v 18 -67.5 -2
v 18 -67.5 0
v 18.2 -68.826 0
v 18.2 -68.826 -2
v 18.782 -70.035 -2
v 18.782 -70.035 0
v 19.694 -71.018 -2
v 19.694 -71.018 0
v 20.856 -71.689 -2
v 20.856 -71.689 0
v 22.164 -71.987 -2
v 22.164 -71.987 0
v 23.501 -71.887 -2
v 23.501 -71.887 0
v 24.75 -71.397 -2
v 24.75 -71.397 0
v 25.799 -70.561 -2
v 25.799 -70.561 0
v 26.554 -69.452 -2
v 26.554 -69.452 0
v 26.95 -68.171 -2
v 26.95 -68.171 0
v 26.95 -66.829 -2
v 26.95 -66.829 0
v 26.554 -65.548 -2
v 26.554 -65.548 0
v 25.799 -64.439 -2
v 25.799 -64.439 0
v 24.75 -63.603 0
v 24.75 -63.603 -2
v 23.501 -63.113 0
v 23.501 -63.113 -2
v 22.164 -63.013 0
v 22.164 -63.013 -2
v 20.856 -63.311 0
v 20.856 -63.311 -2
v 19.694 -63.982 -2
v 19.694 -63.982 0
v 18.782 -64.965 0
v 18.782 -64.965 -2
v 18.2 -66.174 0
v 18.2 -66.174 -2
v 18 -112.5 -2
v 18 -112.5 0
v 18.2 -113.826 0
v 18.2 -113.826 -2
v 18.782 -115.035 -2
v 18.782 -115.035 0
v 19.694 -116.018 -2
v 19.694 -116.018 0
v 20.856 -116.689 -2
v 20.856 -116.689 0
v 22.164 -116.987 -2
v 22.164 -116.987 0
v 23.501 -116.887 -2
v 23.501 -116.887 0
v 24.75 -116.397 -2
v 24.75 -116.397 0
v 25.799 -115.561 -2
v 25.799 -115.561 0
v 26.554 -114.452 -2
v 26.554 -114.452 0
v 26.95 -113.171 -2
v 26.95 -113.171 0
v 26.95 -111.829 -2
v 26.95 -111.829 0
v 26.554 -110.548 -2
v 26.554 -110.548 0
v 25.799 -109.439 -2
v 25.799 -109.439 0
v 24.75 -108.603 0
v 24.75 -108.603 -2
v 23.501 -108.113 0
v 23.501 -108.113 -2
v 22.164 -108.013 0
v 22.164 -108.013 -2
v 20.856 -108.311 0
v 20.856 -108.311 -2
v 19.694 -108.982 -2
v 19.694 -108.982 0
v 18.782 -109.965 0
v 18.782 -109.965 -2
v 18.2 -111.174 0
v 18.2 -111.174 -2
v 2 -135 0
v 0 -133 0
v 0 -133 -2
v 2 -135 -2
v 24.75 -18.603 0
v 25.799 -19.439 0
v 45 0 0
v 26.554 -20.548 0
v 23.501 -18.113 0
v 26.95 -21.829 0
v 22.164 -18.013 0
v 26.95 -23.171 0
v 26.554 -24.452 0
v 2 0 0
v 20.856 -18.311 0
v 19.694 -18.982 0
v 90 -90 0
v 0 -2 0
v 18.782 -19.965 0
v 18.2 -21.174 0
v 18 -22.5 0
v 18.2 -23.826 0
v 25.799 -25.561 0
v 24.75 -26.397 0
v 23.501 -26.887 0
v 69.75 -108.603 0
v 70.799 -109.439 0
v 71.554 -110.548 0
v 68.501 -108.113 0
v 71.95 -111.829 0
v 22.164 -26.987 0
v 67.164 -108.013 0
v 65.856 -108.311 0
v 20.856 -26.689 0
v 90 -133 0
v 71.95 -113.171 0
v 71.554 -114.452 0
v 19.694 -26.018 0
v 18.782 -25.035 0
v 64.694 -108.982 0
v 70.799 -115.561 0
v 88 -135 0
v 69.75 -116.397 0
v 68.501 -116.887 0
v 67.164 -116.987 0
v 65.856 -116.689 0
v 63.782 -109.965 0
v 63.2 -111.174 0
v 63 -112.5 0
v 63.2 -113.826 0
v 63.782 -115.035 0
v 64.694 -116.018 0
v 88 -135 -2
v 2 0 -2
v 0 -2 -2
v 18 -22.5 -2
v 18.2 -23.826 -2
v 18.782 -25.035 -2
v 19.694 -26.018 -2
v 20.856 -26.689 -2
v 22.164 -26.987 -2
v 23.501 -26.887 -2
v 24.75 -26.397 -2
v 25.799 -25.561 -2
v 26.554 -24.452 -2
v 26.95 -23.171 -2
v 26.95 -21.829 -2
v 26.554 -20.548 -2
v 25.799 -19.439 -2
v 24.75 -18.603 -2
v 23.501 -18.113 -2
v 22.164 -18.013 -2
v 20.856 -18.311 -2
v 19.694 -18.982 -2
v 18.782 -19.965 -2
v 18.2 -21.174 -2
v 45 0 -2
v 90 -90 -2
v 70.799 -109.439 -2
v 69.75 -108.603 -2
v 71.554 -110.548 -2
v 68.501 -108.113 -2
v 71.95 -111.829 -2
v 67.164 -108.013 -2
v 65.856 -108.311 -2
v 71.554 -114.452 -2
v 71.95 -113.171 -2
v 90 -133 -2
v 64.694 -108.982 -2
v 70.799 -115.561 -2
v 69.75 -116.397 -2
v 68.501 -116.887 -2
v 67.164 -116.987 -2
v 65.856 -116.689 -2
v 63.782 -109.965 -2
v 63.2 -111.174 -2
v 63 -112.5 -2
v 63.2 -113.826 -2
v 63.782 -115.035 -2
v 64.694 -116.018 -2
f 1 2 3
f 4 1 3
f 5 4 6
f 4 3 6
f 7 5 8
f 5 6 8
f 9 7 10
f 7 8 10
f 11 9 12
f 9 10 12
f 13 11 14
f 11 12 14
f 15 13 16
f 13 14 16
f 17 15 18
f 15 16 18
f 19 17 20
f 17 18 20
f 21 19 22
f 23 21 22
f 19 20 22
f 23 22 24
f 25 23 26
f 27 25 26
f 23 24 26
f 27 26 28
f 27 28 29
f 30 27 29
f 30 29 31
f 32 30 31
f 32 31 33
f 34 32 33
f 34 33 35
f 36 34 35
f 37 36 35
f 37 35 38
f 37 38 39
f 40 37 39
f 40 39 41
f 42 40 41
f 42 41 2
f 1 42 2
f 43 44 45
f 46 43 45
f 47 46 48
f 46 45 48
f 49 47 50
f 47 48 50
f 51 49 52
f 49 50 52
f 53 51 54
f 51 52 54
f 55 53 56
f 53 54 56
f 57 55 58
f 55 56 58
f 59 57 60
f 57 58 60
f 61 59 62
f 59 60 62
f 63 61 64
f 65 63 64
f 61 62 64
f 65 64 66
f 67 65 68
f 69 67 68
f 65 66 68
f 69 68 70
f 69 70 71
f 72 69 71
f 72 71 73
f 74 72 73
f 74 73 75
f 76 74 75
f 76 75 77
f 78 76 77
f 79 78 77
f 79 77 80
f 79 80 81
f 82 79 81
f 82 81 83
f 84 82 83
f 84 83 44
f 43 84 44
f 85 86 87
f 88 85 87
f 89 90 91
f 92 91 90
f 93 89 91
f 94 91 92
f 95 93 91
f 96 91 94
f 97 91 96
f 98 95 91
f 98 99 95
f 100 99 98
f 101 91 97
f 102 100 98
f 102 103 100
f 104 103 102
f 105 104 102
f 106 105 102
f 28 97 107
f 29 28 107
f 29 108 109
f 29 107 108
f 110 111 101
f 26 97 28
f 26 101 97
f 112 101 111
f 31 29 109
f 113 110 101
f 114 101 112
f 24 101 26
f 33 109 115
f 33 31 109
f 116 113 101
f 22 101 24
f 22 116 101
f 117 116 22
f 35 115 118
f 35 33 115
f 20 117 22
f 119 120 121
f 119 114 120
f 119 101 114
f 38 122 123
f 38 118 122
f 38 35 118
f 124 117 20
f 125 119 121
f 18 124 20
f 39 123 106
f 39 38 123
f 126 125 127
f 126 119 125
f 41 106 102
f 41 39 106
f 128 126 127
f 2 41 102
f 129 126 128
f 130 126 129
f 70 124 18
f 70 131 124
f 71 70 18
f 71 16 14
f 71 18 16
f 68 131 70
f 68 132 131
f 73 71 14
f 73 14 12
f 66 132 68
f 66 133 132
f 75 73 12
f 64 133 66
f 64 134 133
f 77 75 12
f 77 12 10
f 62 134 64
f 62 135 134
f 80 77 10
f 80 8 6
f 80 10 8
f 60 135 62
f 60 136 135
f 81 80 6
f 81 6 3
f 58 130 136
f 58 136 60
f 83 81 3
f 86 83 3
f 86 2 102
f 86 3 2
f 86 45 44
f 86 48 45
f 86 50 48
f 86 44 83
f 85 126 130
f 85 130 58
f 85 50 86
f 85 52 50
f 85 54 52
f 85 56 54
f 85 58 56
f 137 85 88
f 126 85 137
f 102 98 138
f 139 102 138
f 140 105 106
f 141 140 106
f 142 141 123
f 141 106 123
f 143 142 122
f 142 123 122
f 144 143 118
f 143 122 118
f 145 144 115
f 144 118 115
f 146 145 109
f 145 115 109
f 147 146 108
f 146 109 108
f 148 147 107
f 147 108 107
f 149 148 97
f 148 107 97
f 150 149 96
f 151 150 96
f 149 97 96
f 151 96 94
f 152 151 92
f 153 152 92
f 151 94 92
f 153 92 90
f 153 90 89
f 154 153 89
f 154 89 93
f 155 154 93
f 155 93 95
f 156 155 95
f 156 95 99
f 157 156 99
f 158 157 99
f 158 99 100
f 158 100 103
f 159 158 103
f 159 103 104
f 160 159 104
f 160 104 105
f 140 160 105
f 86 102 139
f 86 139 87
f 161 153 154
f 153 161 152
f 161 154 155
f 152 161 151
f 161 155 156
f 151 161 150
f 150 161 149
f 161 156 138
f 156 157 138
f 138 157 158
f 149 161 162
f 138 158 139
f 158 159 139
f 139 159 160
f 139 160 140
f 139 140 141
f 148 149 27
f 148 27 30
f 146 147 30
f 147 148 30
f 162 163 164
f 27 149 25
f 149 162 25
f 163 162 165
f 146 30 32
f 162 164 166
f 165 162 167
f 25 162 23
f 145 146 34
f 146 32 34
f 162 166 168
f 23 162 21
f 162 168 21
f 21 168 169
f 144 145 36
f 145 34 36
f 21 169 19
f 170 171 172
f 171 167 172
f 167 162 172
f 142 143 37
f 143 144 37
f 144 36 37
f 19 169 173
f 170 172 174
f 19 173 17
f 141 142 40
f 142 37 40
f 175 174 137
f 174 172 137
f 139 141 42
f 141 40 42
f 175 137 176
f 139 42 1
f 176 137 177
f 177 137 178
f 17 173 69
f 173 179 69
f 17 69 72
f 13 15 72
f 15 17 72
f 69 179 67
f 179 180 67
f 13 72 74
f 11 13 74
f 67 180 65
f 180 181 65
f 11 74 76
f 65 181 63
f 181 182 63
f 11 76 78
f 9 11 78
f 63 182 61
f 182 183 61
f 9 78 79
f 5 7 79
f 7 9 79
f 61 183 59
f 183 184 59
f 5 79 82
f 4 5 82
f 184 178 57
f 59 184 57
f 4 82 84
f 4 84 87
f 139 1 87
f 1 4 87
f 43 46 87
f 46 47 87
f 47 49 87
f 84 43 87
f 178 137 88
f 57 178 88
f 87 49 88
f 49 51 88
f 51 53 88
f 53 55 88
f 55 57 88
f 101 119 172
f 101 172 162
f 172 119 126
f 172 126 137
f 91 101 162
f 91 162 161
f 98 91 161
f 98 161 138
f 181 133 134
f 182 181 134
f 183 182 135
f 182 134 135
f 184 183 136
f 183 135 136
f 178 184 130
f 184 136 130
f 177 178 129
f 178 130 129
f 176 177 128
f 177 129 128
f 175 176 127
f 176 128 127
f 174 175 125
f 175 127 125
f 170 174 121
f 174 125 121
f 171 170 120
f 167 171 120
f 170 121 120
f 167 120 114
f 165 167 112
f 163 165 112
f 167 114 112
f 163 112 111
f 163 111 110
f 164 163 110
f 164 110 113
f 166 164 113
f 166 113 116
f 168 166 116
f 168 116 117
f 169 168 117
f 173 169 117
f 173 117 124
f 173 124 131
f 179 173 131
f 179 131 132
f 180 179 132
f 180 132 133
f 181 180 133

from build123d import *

# Parameters (mm, degrees)
EXTRUDE_1_DEPTH   = 2
HOLE_WIZARD_M81_D = 9
CHAMFER_1_SIZE    = 2


with BuildPart() as part:
    # Эскиз1 → Бобышка-Вытянуть1 (new body)
    with BuildSketch(Plane(origin=(0, 0, 0), x_dir=(1, 0, 0), z_dir=(0, 0, -1))):
        Polygon((0, 0), (0, 135), (90, 135), (90, 90), (45, 0), align=None)
    extrude(amount=EXTRUDE_1_DEPTH)

    # Отверстие с зазором M81 (through all)
    with Locations(Plane(origin=(0, 0, -2), x_dir=(1, 0, 0), z_dir=(0, 0, -1))):
        with Locations((67.5, 112.5), (22.5, 112.5), (22.5, 67.5), (22.5, 22.5)):
            Hole(HOLE_WIZARD_M81_D / 2)

    # Фаска1
    chamfer_1_edges = [part.edges().sort_by_distance(p)[0] for p in [
        (0, 0, -1),
        (0, -135, -1),
        (90, -135, -1),
    ]]
    chamfer(chamfer_1_edges, length=CHAMFER_1_SIZE)


solid = part.part
